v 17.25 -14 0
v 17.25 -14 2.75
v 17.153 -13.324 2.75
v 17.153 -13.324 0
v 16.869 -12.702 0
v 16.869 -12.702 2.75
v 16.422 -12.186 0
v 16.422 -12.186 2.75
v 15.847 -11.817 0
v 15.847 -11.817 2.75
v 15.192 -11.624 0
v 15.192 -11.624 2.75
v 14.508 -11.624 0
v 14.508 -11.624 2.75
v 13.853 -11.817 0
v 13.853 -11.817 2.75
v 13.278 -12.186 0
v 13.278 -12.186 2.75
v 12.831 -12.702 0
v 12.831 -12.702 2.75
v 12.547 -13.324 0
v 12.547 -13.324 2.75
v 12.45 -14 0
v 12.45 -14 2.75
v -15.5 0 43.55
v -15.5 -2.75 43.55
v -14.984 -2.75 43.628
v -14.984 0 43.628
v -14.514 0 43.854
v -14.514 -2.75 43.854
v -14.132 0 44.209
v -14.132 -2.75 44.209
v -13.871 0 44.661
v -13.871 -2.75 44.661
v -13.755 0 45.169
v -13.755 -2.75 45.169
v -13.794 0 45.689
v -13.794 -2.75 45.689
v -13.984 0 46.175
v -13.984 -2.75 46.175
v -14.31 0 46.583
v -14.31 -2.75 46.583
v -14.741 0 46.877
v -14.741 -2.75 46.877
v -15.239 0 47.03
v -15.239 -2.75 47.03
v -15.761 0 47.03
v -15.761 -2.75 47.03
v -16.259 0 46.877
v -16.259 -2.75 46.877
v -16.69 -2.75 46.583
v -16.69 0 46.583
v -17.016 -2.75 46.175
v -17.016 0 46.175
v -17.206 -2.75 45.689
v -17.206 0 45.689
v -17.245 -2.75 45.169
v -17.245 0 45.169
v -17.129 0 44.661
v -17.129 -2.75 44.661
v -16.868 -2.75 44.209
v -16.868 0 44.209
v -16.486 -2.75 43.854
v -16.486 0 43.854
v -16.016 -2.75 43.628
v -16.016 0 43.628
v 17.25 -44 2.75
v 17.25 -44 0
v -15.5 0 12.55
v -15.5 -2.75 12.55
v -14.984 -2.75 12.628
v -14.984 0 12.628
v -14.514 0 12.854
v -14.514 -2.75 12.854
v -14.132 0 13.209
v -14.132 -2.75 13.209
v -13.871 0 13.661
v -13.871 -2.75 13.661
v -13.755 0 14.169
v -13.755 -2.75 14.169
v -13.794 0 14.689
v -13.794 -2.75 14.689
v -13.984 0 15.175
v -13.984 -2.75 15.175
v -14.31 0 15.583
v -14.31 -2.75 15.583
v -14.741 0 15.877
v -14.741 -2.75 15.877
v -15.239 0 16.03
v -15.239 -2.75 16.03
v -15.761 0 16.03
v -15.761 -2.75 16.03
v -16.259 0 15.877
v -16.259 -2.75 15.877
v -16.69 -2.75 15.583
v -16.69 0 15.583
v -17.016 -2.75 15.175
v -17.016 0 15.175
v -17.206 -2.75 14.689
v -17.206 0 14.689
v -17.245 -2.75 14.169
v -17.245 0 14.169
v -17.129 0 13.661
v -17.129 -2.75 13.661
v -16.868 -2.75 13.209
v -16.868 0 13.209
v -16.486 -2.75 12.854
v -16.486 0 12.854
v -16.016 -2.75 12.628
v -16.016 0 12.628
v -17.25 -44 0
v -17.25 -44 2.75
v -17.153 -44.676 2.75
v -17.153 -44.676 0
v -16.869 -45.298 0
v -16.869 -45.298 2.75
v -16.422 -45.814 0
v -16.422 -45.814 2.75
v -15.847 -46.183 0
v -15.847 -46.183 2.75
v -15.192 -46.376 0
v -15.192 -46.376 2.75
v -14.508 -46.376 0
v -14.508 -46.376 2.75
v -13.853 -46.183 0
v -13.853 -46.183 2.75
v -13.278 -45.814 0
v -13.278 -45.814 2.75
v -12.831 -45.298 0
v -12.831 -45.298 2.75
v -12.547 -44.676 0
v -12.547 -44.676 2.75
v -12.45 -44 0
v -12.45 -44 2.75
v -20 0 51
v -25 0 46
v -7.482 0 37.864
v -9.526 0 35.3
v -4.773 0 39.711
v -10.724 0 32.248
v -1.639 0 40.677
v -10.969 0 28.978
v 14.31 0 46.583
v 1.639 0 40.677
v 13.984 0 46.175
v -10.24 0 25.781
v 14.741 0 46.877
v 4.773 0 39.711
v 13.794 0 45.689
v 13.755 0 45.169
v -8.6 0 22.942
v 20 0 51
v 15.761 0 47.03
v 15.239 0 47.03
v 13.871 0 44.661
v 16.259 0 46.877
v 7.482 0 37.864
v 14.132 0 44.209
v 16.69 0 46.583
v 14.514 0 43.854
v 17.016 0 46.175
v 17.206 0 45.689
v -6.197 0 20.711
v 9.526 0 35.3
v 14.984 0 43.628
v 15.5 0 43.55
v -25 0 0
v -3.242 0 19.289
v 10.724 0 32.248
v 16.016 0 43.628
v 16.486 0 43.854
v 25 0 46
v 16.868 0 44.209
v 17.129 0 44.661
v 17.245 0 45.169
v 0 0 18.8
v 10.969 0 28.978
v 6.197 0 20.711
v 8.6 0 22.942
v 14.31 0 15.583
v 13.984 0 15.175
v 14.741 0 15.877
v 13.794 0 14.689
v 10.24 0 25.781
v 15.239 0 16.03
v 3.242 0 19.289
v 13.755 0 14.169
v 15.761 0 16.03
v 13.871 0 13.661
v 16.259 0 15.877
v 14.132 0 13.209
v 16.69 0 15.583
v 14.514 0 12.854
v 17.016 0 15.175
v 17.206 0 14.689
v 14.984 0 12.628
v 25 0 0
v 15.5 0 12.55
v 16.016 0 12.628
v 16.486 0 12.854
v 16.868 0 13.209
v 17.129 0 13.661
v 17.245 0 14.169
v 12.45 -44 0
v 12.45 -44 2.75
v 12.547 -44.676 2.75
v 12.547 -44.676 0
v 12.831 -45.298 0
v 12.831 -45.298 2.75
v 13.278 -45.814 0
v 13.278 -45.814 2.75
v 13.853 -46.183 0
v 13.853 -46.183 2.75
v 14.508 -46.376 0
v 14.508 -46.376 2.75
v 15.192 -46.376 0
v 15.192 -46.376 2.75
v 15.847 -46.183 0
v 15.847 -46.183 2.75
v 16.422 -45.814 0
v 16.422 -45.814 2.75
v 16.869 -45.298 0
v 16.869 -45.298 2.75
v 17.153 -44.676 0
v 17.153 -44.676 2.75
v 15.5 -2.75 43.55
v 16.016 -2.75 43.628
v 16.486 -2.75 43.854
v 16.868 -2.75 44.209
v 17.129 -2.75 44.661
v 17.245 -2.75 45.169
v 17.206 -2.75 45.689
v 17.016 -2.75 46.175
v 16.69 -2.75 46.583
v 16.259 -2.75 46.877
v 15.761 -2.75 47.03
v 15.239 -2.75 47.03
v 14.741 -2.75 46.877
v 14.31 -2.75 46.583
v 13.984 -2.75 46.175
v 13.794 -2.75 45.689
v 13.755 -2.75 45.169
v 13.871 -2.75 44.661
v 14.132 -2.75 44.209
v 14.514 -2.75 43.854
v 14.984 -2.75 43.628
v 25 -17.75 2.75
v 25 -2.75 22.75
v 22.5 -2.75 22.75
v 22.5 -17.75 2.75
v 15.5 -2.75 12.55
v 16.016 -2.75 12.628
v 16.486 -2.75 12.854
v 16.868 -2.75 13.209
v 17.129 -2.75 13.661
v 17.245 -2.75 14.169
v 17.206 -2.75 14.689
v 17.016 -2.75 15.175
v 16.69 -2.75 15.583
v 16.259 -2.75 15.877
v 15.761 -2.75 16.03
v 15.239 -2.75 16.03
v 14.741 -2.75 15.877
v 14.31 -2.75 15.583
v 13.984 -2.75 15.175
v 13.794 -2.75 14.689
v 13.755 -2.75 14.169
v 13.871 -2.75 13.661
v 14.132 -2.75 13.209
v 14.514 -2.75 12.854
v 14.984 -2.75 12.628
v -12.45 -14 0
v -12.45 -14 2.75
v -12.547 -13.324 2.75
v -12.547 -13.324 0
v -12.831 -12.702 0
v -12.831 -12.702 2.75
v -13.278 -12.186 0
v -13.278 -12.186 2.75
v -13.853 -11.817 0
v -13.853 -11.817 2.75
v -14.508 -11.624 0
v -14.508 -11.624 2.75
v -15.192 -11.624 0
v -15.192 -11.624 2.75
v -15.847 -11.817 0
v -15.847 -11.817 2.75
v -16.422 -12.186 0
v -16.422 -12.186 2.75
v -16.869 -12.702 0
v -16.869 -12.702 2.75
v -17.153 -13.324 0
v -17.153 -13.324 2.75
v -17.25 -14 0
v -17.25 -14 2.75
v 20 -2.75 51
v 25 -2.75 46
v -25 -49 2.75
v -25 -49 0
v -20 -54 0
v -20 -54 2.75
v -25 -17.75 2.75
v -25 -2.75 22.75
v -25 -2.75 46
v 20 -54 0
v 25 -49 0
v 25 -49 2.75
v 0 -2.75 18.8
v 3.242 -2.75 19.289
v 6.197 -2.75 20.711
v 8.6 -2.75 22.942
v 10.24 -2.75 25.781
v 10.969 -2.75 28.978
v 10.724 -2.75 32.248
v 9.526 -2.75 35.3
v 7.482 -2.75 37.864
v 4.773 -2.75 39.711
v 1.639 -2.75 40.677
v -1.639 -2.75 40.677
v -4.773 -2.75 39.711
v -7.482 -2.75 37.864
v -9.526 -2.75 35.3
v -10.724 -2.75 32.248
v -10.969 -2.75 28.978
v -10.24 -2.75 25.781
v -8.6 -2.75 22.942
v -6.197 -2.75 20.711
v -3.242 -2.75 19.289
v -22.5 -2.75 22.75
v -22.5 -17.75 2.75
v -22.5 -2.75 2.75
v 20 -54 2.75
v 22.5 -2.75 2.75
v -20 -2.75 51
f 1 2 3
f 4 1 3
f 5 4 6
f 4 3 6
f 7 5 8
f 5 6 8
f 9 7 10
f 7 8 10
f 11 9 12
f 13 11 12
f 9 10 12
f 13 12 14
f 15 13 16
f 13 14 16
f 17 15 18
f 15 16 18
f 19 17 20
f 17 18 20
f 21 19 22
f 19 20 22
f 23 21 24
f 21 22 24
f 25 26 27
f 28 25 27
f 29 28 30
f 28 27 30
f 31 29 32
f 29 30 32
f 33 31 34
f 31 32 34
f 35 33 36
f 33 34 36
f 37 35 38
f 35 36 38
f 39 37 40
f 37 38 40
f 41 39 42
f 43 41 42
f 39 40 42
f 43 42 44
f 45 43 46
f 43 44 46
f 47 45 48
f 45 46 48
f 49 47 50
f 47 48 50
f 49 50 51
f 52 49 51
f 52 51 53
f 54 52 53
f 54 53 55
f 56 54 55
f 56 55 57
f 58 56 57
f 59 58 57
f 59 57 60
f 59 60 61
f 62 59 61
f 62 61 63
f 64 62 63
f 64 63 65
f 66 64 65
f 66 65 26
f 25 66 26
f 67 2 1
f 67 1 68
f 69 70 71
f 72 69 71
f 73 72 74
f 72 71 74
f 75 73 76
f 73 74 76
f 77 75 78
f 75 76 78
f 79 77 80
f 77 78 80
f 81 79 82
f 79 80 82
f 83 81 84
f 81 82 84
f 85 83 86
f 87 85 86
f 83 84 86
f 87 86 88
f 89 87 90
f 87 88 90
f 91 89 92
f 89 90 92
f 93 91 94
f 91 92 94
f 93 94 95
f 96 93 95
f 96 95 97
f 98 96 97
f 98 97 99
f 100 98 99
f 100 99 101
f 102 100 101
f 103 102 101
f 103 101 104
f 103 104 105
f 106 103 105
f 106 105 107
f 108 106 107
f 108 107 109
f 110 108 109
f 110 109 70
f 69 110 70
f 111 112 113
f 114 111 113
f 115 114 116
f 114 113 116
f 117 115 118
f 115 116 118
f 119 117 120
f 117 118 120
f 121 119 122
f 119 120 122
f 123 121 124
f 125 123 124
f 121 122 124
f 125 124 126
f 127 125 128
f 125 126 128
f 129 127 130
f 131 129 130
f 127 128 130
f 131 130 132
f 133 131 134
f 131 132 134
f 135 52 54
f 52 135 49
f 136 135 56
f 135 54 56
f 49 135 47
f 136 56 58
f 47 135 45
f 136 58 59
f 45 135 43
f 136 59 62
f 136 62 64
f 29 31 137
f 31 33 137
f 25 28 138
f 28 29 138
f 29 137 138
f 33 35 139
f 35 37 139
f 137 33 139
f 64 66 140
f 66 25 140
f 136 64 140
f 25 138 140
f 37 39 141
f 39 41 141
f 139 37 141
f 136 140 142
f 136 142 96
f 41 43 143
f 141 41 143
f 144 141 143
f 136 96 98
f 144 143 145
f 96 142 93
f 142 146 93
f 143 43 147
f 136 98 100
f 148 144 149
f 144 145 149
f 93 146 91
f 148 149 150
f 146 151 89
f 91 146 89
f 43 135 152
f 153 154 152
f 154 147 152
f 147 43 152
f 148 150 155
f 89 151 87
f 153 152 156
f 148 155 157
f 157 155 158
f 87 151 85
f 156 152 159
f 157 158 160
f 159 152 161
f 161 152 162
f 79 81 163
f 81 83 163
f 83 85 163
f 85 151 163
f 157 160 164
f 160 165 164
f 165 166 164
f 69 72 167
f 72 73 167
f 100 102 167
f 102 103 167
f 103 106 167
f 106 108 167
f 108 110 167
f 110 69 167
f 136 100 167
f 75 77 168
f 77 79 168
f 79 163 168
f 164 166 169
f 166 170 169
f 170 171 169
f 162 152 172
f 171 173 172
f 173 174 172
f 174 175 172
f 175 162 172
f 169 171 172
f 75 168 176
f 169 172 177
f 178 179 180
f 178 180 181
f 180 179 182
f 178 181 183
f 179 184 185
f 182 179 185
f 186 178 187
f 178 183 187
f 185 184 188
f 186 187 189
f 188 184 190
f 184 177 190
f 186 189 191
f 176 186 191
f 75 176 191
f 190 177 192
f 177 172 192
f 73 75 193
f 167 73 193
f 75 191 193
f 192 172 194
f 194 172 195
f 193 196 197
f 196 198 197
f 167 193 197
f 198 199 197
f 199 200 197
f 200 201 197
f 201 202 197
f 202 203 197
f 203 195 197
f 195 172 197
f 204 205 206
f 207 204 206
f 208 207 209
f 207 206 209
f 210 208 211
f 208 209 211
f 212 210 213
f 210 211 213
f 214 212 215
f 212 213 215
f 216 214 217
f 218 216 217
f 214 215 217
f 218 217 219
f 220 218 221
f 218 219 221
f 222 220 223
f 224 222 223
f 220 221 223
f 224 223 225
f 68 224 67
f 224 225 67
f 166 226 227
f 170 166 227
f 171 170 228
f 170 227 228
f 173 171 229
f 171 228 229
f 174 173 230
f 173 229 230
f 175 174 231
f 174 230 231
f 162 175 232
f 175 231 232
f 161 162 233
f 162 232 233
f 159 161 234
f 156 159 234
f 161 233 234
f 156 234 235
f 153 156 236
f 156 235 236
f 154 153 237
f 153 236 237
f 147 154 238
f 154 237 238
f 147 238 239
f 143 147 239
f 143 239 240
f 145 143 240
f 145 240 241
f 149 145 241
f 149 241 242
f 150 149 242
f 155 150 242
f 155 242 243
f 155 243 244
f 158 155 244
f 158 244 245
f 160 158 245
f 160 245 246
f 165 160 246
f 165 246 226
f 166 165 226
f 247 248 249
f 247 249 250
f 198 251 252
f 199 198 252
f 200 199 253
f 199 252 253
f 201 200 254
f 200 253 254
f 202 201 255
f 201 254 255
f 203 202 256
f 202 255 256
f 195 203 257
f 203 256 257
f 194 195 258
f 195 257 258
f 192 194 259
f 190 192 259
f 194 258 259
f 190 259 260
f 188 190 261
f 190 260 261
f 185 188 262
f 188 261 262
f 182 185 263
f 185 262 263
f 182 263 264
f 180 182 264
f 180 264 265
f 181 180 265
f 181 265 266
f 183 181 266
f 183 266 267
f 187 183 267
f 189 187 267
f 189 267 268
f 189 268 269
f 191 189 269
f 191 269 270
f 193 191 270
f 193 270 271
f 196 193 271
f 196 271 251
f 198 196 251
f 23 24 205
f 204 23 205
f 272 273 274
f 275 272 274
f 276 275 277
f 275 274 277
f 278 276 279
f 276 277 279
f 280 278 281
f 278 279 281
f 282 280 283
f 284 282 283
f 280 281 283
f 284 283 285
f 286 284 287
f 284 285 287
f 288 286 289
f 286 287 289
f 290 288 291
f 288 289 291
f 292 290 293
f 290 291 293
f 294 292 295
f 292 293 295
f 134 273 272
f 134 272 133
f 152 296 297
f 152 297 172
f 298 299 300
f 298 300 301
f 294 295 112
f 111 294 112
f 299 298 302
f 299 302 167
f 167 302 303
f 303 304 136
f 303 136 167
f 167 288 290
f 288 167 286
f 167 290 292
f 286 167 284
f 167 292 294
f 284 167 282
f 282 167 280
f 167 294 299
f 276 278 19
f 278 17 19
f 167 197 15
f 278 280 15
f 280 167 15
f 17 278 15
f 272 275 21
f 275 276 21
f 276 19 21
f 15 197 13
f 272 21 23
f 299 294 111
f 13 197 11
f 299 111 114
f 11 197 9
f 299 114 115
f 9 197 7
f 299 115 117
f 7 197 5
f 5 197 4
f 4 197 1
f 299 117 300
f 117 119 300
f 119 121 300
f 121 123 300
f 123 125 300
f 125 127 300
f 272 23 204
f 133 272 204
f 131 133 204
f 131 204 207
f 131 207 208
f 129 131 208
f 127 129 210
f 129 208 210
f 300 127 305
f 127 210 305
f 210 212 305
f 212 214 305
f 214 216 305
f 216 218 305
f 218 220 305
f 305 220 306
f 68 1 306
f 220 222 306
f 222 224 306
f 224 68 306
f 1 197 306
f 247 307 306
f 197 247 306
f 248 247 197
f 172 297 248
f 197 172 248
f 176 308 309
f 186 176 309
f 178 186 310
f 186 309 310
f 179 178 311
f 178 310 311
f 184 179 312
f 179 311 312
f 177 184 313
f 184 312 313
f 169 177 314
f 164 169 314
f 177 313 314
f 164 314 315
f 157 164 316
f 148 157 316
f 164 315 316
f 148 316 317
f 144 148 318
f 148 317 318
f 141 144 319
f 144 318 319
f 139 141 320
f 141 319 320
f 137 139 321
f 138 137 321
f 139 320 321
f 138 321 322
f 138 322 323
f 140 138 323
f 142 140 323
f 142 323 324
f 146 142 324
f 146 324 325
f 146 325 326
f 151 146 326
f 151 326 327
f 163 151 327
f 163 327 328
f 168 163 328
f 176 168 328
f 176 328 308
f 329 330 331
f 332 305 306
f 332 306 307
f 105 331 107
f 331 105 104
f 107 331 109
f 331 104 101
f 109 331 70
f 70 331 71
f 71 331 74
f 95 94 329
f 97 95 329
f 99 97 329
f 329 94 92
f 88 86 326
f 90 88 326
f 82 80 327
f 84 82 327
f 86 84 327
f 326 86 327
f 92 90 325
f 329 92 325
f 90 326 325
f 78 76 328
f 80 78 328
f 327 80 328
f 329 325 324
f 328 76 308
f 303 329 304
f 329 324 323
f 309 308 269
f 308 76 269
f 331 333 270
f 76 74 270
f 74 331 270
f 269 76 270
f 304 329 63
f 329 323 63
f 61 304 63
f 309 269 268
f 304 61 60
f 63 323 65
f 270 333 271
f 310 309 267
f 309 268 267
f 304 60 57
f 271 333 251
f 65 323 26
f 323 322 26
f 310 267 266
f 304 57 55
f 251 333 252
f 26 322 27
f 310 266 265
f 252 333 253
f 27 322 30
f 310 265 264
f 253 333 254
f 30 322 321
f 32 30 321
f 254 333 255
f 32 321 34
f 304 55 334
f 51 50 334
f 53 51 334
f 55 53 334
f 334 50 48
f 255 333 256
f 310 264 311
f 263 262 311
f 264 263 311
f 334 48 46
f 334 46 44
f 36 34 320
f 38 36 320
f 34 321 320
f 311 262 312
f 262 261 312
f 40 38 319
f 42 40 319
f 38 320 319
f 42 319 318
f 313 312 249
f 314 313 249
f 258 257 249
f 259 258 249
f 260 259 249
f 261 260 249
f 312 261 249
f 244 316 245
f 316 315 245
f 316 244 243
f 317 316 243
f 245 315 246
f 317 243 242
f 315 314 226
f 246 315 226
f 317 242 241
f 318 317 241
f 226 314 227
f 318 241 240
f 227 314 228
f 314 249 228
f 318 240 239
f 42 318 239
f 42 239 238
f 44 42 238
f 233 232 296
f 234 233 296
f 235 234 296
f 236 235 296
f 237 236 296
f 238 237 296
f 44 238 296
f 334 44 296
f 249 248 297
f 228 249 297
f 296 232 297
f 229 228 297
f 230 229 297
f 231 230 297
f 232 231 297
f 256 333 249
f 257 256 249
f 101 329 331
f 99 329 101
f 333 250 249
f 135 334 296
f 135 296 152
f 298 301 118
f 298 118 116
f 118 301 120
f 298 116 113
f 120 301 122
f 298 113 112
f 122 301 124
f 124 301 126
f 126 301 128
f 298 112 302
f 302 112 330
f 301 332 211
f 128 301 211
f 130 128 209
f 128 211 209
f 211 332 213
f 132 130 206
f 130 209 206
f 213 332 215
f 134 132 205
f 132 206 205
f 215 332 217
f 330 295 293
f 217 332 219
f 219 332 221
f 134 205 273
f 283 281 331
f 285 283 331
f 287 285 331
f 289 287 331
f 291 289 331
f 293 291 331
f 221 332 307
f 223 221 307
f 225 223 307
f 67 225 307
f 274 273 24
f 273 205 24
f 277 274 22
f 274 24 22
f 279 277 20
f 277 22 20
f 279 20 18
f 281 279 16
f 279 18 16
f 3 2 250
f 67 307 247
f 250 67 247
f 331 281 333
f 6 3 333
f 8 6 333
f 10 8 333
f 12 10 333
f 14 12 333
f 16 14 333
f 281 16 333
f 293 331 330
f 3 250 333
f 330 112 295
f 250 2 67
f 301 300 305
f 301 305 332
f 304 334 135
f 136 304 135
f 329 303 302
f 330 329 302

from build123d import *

# Parameters (mm, degrees)
PAD_DEPTH       = 25
CHAMFER_SIZE    = 5
PAD001_DEPTH    = 2.5
SKETCH002_R     = 11
POCKET_DEPTH    = 5
SKETCH003_R     = 1.75
HOLE_DEPTH      = 25
POCKET001_DEPTH = 5


with BuildPart() as part:
    # Sketch → Pad (new body, symmetric)
    with BuildSketch(Plane.YZ):
        Polygon((0, 51), (0, 0), (-54, 0), (-54, 2.75), (-2.75, 2.75), (-2.75, 51), align=None)
    extrude(amount=PAD_DEPTH, both=True)

    # Chamfer
    chamfer_edges = [part.edges().sort_by_distance(p)[0] for p in [
        (25, -1.375, 51),
        (-25, -1.375, 51),
        (25, -54, 1.375),
        (-25, -54, 1.375),
    ]]
    chamfer(chamfer_edges, length=CHAMFER_SIZE)

    # Sketch001 (on Face6 of Chamfer) → Pad001 (join)
    with BuildSketch(Plane.YZ.offset(25)):
        Polygon((-2.75, 2.75), (-2.75, 22.75), (-17.75, 2.75), align=None)
    pad001 = extrude(amount=-PAD001_DEPTH)

    # Mirrored: Pad001 across YZ
    add(pad001.mirror(Plane.YZ))

    # Sketch002 (on Face7 of Mirrored) → Pocket (cut)
    with BuildSketch(Plane(origin=(0, -2.75, 0), x_dir=(0, 0, -1), z_dir=(0, -1, 0))):
        with Locations((-29.8, 0)):
            Circle(SKETCH002_R)
    extrude(amount=-POCKET_DEPTH, mode=Mode.SUBTRACT)

    # Sketch003 (on Face9 of Pocket) → Hole (cut)
    with BuildSketch(Plane(origin=(0, -2.75, 0), x_dir=(0, 0, -1), z_dir=(0, -1, 0))):
        with Locations((-45.3, 15.5)):
            Circle(SKETCH003_R)
        with Locations((-14.3, 15.5)):
            Circle(SKETCH003_R)
        with Locations((-14.3, -15.5)):
            Circle(SKETCH003_R)
        with Locations((-45.3, -15.5)):
            Circle(SKETCH003_R)
    extrude(amount=-HOLE_DEPTH, mode=Mode.SUBTRACT)

    # Sketch004 (on Face15 of Hole) → Pocket001 (cut)
    with BuildSketch(Plane(origin=(0, 0, 2.75), x_dir=(0, -1, 0), z_dir=(0, 0, 1))):
        with BuildLine():
            ThreePointArc((14, 17.25), (11.6, 14.85), (14, 12.45))
            Line((14, 12.45), (44, 12.45))
            ThreePointArc((44, 12.45), (46.4, 14.85), (44, 17.25))
            Line((14, 17.25), (44, 17.25))
        make_face()
        with BuildLine():
            ThreePointArc((14, -12.45), (11.6, -14.85), (14, -17.25))
            Line((14, -17.25), (44, -17.25))
            ThreePointArc((44, -17.25), (46.4, -14.85), (44, -12.45))
            Line((14, -12.45), (44, -12.45))
        make_face()
    extrude(amount=-POCKET001_DEPTH, mode=Mode.SUBTRACT)


solid = part.part
